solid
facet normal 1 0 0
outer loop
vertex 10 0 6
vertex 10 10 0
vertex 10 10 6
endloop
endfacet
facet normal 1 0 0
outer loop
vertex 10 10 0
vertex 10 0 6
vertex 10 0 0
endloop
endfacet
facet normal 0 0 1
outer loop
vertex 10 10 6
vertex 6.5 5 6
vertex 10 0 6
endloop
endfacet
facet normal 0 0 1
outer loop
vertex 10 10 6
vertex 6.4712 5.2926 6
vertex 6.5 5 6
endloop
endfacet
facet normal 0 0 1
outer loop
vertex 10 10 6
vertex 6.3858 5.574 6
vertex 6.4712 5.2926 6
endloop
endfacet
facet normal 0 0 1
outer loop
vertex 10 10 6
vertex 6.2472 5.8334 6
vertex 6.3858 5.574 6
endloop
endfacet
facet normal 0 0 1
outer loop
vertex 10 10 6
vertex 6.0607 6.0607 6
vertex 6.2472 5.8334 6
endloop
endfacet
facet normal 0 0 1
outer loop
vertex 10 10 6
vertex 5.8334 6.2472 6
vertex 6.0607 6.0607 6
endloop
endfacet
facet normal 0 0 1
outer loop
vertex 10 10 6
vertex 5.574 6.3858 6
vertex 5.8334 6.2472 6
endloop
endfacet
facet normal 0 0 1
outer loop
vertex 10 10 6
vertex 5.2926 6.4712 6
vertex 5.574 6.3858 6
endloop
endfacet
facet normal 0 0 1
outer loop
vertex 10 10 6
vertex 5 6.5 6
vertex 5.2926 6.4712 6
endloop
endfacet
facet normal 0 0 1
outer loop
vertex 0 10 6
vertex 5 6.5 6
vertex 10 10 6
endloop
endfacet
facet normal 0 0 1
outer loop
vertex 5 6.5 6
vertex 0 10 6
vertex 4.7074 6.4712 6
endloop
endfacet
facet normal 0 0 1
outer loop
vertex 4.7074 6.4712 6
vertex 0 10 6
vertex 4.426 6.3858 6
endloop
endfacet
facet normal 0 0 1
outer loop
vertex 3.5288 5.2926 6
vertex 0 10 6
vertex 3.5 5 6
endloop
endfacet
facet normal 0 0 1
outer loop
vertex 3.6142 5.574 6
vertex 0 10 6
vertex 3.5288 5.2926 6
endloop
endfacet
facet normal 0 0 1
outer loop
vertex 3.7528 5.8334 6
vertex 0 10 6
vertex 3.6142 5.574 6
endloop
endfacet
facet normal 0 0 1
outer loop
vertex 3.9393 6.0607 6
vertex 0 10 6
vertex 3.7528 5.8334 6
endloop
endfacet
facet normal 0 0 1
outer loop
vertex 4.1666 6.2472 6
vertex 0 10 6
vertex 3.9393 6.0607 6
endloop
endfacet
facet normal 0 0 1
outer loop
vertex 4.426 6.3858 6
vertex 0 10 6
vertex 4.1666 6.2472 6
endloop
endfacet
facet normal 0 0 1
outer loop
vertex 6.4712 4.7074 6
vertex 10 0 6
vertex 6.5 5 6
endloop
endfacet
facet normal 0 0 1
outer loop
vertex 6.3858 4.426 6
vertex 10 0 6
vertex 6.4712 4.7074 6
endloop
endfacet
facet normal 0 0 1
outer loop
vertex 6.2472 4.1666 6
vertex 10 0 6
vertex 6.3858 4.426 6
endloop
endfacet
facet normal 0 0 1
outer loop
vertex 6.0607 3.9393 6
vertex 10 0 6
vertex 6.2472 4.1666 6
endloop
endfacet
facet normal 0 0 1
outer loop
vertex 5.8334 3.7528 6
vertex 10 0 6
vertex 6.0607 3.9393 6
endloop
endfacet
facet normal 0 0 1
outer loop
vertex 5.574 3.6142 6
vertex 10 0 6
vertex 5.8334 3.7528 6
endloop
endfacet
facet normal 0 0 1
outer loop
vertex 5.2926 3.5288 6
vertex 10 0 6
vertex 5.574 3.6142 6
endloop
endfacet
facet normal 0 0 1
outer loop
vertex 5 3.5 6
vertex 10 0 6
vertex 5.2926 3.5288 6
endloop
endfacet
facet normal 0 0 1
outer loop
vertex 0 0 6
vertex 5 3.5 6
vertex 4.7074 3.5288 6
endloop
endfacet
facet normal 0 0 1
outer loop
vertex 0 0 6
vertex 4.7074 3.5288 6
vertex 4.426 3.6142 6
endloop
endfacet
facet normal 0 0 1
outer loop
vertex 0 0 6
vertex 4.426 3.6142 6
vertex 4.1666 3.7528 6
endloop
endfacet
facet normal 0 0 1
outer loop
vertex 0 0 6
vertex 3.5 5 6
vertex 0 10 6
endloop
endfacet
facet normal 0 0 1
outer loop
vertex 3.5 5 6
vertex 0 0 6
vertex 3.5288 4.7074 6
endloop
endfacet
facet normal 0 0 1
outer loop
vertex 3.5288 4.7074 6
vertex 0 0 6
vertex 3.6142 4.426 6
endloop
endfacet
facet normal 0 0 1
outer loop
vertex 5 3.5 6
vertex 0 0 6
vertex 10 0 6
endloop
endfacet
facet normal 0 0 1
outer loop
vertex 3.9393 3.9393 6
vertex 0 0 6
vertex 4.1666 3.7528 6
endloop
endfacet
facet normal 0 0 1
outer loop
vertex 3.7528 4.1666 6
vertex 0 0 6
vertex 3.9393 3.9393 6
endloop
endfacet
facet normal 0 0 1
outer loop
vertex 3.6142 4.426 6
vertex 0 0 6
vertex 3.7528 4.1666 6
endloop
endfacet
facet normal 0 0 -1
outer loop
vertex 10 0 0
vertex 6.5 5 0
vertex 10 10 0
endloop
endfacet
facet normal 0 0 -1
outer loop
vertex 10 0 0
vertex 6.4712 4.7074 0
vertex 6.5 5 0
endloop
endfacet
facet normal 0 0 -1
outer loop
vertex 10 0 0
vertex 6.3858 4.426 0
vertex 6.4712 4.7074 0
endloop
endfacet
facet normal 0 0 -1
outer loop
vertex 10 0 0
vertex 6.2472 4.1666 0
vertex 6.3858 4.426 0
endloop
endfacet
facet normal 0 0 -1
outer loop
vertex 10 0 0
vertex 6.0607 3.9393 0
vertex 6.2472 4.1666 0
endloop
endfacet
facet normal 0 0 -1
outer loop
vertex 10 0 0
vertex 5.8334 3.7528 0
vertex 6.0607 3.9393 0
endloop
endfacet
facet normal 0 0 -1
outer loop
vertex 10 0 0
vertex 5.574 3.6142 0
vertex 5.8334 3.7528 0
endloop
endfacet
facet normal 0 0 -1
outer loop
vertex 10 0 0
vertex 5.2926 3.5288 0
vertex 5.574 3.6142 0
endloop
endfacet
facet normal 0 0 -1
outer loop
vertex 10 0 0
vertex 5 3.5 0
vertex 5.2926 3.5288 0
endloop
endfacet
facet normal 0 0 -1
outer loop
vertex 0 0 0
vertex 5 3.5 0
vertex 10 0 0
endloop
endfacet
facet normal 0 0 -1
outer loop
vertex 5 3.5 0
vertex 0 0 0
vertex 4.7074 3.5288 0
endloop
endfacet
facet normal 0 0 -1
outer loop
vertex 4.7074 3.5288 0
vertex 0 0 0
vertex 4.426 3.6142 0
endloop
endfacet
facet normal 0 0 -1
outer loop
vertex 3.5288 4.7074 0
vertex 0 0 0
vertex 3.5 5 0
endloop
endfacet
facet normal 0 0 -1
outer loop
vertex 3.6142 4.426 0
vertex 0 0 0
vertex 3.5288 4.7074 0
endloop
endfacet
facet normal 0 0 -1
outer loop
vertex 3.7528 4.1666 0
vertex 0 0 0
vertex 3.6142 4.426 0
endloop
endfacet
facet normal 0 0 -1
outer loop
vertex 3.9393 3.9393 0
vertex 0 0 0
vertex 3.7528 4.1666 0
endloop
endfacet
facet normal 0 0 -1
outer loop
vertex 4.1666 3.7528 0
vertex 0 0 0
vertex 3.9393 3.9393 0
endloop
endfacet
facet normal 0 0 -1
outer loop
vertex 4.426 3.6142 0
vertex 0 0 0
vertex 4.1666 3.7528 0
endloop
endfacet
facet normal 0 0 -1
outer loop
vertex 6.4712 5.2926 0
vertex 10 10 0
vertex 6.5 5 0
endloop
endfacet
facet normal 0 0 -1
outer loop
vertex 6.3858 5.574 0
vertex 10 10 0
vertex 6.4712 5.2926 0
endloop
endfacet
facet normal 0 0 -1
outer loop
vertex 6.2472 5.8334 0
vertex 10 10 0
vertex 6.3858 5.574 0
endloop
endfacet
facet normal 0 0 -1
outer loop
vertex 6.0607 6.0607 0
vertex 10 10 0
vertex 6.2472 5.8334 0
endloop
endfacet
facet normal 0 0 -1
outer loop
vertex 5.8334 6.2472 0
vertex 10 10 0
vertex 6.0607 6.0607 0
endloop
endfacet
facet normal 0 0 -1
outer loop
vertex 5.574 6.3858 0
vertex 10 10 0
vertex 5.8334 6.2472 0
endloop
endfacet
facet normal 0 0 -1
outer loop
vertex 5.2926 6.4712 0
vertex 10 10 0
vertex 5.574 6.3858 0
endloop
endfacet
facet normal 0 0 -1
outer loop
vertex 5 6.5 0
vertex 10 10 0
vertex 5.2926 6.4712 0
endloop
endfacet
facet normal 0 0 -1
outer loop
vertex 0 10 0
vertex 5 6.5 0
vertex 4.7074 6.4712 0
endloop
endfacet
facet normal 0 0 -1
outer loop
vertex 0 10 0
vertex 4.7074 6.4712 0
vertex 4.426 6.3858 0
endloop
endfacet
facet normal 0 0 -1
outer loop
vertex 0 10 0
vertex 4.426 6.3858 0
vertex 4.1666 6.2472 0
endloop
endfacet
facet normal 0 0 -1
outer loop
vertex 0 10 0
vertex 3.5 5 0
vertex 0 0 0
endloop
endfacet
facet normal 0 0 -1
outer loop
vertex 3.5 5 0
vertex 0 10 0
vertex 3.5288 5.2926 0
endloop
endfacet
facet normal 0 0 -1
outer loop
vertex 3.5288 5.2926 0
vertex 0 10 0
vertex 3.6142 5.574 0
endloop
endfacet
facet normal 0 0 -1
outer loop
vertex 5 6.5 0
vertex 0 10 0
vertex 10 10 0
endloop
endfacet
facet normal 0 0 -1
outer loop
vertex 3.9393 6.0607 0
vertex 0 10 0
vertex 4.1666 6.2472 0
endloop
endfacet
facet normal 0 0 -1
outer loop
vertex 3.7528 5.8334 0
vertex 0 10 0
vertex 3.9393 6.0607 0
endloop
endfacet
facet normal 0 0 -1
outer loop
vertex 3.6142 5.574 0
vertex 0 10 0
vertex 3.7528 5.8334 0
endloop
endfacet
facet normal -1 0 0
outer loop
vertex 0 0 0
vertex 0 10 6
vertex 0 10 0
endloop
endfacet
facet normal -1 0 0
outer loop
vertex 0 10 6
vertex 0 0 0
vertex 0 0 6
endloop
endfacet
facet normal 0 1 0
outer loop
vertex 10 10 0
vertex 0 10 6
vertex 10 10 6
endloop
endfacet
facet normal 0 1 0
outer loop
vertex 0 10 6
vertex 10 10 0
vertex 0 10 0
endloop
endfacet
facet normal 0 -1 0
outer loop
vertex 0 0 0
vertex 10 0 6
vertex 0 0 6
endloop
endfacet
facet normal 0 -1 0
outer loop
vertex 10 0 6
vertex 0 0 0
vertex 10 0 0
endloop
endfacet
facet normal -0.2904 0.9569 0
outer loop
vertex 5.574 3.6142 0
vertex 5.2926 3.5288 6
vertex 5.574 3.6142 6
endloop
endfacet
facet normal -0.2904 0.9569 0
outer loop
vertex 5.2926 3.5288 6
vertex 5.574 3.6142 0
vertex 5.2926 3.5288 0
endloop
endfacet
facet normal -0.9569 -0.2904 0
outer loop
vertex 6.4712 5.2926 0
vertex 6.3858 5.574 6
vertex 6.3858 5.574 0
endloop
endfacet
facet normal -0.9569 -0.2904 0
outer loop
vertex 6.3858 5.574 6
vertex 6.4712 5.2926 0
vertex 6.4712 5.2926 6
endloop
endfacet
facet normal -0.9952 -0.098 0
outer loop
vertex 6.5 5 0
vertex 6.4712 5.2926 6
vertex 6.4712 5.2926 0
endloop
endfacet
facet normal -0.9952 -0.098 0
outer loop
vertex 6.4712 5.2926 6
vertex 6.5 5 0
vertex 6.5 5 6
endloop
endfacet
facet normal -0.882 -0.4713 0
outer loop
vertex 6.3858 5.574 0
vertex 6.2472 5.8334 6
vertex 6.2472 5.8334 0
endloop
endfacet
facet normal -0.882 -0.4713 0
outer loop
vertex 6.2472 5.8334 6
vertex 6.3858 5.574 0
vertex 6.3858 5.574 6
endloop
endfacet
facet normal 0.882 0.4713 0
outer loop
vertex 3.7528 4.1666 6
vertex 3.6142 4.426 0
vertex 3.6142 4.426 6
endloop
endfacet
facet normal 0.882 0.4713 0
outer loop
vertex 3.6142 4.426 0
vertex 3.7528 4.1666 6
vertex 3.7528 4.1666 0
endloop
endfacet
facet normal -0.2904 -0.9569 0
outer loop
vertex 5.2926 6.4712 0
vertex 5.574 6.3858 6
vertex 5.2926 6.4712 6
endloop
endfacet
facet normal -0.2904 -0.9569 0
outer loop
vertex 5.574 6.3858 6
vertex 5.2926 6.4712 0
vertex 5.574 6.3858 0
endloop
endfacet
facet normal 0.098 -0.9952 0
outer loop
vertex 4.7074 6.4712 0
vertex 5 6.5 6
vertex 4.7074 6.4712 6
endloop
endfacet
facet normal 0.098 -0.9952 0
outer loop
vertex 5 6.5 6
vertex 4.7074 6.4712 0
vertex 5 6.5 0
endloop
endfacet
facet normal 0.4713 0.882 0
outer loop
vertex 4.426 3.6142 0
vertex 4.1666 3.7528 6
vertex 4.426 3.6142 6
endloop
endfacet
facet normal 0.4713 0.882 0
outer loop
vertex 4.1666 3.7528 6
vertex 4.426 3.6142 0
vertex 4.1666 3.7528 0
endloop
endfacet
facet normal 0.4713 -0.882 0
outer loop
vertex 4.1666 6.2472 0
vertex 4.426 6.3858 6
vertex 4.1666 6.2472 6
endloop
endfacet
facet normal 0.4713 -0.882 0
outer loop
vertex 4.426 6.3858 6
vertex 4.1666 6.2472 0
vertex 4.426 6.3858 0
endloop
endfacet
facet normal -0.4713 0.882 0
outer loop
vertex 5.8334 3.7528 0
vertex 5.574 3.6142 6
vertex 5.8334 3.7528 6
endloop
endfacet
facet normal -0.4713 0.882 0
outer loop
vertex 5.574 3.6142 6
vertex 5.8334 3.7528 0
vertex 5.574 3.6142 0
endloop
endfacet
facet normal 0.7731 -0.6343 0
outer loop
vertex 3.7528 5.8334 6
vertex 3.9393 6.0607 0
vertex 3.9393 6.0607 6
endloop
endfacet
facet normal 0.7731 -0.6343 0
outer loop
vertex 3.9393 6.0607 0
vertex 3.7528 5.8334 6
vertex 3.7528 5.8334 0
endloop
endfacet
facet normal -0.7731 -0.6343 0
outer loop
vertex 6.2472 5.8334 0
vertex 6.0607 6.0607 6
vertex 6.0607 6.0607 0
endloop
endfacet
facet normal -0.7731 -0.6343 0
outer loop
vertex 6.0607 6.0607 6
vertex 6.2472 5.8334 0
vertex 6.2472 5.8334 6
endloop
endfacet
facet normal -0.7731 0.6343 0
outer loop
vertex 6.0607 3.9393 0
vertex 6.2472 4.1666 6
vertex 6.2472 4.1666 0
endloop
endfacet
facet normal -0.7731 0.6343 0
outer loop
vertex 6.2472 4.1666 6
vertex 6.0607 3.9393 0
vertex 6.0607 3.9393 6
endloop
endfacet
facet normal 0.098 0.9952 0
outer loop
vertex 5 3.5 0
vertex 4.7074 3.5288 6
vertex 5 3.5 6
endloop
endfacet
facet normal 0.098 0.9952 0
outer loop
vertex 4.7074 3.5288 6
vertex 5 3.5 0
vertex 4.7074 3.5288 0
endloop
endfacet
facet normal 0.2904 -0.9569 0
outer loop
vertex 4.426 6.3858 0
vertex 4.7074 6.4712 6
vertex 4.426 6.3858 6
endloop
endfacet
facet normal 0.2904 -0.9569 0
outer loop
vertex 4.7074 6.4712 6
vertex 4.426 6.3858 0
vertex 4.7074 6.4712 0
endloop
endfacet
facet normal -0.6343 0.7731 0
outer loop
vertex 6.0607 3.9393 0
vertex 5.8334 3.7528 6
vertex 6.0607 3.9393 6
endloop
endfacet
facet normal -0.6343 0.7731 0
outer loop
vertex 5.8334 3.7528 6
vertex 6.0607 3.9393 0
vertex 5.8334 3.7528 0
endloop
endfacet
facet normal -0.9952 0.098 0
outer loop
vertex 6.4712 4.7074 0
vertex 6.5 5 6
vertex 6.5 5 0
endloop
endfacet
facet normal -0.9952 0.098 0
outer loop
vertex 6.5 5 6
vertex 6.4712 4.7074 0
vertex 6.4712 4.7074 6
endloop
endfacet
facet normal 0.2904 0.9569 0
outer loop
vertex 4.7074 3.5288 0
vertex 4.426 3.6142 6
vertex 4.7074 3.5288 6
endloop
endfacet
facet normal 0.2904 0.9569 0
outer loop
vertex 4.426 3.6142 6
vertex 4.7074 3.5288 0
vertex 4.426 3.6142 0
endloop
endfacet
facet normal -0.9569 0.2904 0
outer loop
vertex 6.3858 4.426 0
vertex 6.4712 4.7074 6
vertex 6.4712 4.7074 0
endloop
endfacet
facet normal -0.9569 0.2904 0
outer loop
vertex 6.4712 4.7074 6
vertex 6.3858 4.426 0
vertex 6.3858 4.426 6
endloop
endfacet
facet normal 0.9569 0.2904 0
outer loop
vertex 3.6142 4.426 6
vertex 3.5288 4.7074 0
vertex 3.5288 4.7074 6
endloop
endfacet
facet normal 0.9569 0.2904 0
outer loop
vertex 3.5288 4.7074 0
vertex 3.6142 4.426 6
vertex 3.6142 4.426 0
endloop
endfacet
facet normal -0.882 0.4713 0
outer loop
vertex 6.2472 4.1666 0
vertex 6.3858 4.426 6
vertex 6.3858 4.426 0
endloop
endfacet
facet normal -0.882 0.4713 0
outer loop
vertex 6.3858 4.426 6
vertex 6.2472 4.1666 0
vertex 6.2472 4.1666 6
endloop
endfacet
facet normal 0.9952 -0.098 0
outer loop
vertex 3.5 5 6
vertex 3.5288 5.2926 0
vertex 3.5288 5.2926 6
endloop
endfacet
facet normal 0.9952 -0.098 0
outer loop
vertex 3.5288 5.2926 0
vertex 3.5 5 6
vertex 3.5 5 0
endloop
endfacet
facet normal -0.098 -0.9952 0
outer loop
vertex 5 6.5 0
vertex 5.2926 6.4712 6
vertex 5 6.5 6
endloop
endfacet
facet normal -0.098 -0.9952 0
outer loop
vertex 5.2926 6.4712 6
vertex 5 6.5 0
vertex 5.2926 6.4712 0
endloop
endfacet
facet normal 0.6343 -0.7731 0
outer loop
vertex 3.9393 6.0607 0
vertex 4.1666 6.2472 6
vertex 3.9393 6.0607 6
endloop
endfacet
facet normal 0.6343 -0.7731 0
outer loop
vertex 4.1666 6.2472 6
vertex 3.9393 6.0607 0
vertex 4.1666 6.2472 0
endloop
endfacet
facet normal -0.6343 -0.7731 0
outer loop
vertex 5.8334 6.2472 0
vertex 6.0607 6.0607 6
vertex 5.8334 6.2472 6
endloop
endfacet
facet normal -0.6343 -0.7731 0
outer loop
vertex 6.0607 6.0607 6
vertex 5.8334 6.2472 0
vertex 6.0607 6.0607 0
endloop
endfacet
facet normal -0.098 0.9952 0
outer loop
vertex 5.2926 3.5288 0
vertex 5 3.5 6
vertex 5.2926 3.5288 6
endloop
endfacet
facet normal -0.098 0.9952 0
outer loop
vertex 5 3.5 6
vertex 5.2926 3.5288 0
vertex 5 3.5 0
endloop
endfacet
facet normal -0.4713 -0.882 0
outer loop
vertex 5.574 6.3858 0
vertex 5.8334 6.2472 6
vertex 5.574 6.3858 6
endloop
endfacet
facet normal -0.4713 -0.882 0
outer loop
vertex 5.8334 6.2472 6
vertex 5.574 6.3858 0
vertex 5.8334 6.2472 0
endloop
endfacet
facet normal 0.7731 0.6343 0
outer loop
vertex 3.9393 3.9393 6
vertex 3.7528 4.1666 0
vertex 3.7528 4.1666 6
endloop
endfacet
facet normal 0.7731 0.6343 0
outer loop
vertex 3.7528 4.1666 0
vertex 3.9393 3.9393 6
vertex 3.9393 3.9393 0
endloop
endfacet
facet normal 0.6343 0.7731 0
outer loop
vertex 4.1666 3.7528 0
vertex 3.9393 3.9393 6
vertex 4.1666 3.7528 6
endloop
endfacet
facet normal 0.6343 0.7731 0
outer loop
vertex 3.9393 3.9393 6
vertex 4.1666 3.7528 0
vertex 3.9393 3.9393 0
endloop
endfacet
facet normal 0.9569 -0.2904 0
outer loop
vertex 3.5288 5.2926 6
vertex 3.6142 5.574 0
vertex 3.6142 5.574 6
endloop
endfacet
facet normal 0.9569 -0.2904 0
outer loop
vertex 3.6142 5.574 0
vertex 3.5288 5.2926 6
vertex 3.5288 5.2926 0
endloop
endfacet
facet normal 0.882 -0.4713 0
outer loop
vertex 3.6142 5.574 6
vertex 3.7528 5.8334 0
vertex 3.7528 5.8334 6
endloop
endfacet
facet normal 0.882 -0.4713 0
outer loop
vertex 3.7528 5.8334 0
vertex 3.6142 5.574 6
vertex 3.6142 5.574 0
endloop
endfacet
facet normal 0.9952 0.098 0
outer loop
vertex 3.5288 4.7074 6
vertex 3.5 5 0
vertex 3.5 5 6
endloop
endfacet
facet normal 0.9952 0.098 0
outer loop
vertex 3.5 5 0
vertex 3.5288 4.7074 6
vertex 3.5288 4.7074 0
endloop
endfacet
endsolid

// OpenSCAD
$fn = 32;

// ----------------------------------------------------------------------
// Micro pad: drilled pad, 5-20 mm class
// ----------------------------------------------------------------------

// --- parameters (mm) ---
pad_l = 10;               // pad length, X
pad_w = 10;               // pad width, Y
pad_t = 6;                // pad thickness, Z
hole_d = 3;               // through hole diameter

difference() {
  cube([pad_l, pad_w, pad_t]);
  translate([pad_l / 2, pad_w / 2, -1])
    cylinder(h = pad_t + 2, d = hole_d);
}
